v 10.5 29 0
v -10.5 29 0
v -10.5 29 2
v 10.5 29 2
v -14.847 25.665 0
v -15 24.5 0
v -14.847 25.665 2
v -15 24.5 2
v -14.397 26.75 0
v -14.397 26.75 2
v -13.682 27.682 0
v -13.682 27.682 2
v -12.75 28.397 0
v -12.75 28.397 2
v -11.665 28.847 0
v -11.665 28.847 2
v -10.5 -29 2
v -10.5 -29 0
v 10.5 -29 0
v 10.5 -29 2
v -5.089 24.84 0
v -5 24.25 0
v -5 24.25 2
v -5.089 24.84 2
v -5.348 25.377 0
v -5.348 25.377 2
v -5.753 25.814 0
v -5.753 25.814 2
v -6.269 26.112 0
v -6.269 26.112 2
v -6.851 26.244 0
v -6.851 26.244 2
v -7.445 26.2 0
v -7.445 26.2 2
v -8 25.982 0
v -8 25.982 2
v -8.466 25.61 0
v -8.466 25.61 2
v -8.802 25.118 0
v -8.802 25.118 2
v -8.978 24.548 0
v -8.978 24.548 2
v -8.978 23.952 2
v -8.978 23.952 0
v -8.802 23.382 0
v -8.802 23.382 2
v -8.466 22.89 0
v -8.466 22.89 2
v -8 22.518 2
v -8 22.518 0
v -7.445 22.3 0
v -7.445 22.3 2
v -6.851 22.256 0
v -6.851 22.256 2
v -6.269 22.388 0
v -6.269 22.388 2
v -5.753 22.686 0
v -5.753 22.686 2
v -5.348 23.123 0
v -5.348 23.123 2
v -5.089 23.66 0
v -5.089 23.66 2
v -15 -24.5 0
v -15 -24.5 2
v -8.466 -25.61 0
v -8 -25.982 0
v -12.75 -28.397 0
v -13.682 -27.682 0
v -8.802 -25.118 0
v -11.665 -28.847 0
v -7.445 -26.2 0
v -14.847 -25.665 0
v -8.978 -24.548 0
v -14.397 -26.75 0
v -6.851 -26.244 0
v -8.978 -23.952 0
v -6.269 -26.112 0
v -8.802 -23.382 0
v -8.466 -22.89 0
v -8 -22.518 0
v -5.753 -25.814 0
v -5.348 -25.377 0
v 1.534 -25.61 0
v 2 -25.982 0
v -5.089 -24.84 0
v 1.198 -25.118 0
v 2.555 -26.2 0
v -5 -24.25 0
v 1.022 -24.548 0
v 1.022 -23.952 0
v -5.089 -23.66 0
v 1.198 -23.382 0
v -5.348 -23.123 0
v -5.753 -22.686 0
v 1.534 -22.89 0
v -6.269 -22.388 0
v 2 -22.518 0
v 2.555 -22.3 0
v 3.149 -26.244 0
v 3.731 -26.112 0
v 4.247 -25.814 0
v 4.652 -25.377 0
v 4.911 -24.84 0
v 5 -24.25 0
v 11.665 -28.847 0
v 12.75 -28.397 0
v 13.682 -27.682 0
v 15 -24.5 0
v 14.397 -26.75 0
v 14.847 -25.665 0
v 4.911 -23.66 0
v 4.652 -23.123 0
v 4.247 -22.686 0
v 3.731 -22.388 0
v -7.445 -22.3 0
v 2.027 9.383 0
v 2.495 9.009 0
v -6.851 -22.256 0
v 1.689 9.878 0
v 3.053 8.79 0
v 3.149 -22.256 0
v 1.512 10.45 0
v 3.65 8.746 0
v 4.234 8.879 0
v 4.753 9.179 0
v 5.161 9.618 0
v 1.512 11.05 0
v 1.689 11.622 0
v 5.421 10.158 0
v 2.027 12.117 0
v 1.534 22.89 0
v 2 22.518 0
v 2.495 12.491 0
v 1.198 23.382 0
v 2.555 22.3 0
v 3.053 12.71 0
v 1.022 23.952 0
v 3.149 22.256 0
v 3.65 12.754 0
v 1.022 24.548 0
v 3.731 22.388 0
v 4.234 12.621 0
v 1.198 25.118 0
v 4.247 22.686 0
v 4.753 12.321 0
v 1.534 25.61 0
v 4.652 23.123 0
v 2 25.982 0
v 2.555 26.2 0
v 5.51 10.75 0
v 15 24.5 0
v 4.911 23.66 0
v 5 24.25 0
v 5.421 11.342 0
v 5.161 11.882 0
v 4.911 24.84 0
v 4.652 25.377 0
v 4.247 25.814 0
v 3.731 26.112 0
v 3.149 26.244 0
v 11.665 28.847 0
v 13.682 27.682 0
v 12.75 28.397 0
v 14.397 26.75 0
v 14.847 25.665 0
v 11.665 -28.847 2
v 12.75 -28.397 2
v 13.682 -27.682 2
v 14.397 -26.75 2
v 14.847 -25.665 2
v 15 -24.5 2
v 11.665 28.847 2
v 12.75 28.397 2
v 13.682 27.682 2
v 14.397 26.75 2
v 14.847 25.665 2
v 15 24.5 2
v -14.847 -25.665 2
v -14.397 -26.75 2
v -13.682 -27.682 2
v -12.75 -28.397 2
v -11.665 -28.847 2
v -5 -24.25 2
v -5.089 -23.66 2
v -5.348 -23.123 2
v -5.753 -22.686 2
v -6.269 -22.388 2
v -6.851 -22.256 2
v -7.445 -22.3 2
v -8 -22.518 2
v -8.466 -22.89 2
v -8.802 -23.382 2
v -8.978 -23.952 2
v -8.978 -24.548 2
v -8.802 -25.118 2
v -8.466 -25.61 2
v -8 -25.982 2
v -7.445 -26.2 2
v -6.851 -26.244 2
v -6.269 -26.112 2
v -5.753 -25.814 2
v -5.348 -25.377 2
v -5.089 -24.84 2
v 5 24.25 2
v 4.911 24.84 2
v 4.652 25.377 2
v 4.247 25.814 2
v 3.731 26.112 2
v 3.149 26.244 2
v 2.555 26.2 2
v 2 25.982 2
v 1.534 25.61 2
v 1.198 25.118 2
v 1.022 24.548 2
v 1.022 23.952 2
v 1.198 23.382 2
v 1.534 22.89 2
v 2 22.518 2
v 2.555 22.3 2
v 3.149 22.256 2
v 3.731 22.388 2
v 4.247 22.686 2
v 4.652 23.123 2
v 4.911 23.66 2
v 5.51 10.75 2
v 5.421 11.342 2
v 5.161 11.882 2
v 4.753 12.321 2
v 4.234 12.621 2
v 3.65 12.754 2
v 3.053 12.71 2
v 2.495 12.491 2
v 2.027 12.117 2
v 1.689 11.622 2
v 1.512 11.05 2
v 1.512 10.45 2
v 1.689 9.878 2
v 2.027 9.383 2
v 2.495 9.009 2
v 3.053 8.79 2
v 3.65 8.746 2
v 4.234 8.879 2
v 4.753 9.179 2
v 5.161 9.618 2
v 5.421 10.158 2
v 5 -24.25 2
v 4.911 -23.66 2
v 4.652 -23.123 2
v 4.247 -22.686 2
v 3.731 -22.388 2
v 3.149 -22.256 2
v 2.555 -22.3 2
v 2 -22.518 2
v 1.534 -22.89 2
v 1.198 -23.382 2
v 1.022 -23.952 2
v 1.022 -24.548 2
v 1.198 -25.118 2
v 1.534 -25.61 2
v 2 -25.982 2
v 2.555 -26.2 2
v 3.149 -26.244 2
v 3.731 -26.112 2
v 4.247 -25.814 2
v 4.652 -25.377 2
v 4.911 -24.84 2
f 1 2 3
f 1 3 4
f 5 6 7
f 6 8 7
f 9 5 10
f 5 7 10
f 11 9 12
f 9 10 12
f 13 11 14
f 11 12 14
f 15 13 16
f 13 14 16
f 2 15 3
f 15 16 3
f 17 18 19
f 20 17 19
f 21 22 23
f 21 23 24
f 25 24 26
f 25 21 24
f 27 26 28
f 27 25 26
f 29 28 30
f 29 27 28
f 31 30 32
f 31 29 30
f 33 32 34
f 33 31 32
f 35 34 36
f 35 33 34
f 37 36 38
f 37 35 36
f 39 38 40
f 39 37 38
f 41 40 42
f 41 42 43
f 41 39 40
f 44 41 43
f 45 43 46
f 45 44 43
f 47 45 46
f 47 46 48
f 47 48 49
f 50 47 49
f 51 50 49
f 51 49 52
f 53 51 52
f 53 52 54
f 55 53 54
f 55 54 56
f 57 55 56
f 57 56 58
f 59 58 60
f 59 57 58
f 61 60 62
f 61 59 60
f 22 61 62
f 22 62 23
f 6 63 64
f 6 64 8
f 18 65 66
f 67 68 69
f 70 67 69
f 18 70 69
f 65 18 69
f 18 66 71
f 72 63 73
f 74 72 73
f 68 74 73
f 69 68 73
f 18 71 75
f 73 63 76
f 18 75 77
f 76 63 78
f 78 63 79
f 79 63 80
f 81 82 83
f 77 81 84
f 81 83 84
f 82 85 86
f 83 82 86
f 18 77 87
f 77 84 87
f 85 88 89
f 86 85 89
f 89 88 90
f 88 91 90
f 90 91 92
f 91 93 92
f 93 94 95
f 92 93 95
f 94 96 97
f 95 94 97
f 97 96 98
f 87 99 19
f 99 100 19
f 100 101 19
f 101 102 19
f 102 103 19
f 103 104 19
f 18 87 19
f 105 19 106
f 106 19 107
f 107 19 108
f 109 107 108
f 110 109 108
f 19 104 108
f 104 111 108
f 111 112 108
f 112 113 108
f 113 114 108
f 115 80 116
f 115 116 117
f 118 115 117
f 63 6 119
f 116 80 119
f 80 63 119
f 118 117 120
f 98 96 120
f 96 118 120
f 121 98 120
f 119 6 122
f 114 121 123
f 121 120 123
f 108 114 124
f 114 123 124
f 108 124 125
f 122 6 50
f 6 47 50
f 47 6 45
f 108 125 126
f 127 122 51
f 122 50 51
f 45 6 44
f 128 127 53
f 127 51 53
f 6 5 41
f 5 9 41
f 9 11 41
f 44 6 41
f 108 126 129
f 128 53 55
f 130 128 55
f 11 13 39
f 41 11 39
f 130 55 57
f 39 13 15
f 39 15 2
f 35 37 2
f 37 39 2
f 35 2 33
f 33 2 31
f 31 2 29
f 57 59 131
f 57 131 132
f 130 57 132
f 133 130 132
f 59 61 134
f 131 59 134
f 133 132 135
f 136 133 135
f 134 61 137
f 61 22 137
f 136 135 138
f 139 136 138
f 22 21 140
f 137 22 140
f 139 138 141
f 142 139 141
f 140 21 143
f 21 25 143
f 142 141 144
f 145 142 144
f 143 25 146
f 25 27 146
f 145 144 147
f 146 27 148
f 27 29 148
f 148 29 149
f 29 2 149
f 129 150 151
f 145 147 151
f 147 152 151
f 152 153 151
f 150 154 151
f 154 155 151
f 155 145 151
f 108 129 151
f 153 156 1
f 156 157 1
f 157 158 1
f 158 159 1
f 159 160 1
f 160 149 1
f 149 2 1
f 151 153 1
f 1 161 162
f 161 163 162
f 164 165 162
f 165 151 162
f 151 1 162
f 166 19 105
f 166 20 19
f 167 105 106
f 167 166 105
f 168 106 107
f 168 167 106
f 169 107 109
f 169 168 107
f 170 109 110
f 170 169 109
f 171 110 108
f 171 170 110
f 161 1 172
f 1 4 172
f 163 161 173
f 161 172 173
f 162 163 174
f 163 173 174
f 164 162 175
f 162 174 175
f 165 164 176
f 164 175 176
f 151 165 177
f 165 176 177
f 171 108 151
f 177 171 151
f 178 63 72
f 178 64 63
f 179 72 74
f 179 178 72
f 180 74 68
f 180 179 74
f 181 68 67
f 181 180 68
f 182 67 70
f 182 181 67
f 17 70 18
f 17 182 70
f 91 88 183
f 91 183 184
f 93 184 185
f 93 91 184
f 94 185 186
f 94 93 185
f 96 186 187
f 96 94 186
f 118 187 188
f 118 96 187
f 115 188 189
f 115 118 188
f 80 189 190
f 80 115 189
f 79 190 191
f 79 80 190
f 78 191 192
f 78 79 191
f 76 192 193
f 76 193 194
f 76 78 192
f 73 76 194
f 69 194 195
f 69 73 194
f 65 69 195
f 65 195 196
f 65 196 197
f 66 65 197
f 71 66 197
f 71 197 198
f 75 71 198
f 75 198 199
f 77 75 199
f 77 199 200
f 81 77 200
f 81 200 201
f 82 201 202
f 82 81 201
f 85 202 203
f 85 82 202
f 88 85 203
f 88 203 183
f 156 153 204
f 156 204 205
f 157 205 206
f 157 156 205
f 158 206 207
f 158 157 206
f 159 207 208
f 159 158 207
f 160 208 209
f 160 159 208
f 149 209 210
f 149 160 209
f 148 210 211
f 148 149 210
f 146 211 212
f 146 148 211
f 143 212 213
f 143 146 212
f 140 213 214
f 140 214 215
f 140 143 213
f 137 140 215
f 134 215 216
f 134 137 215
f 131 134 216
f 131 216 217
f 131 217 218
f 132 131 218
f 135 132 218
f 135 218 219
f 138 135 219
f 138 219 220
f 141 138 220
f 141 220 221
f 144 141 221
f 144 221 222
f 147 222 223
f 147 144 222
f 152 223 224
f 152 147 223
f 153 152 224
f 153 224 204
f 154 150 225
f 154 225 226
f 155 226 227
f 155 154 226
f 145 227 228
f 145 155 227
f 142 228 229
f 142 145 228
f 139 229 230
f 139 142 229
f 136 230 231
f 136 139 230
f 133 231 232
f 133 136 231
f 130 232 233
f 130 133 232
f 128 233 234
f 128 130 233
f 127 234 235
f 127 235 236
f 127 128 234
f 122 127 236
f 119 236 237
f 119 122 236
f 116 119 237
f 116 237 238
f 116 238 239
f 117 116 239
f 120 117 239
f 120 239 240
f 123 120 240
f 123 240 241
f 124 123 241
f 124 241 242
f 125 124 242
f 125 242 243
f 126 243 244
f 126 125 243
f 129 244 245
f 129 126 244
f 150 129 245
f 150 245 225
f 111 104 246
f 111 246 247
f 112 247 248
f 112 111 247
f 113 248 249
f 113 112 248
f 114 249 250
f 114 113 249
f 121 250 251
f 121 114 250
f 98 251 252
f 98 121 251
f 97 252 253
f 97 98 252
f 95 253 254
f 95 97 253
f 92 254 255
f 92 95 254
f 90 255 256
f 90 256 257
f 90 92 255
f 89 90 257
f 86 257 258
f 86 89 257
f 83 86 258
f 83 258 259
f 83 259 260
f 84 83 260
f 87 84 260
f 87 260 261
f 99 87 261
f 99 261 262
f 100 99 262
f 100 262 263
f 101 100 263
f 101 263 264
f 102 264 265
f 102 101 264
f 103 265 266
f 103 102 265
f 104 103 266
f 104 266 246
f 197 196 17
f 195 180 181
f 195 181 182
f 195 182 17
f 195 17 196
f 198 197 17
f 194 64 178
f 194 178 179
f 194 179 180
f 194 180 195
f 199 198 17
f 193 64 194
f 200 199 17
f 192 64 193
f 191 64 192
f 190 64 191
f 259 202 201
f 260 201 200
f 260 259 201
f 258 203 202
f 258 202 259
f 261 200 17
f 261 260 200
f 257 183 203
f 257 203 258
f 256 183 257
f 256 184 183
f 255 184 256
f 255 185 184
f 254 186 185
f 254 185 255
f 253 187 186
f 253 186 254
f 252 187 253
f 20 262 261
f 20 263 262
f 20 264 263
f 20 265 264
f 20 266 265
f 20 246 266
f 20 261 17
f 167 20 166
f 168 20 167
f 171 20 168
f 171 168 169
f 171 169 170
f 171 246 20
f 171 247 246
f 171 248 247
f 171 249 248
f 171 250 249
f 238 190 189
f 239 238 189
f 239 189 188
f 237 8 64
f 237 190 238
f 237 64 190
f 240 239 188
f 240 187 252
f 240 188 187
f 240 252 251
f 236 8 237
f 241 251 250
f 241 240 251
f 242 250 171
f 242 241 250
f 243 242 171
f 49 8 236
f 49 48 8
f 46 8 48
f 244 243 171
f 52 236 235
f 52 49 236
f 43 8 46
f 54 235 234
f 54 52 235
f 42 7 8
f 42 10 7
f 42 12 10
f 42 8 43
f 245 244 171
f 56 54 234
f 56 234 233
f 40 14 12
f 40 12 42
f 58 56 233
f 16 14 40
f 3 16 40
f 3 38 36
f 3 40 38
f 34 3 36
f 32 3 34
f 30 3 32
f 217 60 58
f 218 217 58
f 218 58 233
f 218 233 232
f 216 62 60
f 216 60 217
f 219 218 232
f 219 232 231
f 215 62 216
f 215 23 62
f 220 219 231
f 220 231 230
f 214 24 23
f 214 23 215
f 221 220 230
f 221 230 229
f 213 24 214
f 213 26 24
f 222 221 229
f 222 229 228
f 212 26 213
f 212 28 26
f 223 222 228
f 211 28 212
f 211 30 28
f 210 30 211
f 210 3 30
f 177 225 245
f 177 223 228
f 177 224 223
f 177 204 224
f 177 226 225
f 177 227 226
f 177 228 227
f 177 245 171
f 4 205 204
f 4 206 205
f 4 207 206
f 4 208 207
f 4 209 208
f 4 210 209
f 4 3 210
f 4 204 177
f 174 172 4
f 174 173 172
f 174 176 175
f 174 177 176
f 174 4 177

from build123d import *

# Parameters (mm, degrees)
SKETCH1_W           = 30
SKETCH1_H           = 58
SKETCH1_R           = 2
SKETCH1_R_2         = 2.01
BOSS_EXTRUDE1_DEPTH = 2
FILLET1_R           = 4.5


with BuildPart() as part:
    # Sketch1 → Boss-Extrude1 (new body)
    with BuildSketch(Plane.XY):
        Rectangle(SKETCH1_W, SKETCH1_H)
        with Locations((3, 24.25)):
            Circle(SKETCH1_R, mode=Mode.SUBTRACT)
        with Locations((-7, 24.25)):
            Circle(SKETCH1_R, mode=Mode.SUBTRACT)
        with Locations((-7, -24.25)):
            Circle(SKETCH1_R, mode=Mode.SUBTRACT)
        with Locations((3, -24.25)):
            Circle(SKETCH1_R, mode=Mode.SUBTRACT)
        with Locations((3.5, 10.75)):
            Circle(SKETCH1_R_2, mode=Mode.SUBTRACT)
    extrude(amount=BOSS_EXTRUDE1_DEPTH)

    # Fillet1
    fillet1_edges = [part.edges().sort_by_distance(p)[0] for p in [
        (-15, 29, 1),
        (15, 29, 1),
        (15, -29, 1),
        (-15, -29, 1),
    ]]
    fillet(fillet1_edges, radius=FILLET1_R)


solid = part.part
